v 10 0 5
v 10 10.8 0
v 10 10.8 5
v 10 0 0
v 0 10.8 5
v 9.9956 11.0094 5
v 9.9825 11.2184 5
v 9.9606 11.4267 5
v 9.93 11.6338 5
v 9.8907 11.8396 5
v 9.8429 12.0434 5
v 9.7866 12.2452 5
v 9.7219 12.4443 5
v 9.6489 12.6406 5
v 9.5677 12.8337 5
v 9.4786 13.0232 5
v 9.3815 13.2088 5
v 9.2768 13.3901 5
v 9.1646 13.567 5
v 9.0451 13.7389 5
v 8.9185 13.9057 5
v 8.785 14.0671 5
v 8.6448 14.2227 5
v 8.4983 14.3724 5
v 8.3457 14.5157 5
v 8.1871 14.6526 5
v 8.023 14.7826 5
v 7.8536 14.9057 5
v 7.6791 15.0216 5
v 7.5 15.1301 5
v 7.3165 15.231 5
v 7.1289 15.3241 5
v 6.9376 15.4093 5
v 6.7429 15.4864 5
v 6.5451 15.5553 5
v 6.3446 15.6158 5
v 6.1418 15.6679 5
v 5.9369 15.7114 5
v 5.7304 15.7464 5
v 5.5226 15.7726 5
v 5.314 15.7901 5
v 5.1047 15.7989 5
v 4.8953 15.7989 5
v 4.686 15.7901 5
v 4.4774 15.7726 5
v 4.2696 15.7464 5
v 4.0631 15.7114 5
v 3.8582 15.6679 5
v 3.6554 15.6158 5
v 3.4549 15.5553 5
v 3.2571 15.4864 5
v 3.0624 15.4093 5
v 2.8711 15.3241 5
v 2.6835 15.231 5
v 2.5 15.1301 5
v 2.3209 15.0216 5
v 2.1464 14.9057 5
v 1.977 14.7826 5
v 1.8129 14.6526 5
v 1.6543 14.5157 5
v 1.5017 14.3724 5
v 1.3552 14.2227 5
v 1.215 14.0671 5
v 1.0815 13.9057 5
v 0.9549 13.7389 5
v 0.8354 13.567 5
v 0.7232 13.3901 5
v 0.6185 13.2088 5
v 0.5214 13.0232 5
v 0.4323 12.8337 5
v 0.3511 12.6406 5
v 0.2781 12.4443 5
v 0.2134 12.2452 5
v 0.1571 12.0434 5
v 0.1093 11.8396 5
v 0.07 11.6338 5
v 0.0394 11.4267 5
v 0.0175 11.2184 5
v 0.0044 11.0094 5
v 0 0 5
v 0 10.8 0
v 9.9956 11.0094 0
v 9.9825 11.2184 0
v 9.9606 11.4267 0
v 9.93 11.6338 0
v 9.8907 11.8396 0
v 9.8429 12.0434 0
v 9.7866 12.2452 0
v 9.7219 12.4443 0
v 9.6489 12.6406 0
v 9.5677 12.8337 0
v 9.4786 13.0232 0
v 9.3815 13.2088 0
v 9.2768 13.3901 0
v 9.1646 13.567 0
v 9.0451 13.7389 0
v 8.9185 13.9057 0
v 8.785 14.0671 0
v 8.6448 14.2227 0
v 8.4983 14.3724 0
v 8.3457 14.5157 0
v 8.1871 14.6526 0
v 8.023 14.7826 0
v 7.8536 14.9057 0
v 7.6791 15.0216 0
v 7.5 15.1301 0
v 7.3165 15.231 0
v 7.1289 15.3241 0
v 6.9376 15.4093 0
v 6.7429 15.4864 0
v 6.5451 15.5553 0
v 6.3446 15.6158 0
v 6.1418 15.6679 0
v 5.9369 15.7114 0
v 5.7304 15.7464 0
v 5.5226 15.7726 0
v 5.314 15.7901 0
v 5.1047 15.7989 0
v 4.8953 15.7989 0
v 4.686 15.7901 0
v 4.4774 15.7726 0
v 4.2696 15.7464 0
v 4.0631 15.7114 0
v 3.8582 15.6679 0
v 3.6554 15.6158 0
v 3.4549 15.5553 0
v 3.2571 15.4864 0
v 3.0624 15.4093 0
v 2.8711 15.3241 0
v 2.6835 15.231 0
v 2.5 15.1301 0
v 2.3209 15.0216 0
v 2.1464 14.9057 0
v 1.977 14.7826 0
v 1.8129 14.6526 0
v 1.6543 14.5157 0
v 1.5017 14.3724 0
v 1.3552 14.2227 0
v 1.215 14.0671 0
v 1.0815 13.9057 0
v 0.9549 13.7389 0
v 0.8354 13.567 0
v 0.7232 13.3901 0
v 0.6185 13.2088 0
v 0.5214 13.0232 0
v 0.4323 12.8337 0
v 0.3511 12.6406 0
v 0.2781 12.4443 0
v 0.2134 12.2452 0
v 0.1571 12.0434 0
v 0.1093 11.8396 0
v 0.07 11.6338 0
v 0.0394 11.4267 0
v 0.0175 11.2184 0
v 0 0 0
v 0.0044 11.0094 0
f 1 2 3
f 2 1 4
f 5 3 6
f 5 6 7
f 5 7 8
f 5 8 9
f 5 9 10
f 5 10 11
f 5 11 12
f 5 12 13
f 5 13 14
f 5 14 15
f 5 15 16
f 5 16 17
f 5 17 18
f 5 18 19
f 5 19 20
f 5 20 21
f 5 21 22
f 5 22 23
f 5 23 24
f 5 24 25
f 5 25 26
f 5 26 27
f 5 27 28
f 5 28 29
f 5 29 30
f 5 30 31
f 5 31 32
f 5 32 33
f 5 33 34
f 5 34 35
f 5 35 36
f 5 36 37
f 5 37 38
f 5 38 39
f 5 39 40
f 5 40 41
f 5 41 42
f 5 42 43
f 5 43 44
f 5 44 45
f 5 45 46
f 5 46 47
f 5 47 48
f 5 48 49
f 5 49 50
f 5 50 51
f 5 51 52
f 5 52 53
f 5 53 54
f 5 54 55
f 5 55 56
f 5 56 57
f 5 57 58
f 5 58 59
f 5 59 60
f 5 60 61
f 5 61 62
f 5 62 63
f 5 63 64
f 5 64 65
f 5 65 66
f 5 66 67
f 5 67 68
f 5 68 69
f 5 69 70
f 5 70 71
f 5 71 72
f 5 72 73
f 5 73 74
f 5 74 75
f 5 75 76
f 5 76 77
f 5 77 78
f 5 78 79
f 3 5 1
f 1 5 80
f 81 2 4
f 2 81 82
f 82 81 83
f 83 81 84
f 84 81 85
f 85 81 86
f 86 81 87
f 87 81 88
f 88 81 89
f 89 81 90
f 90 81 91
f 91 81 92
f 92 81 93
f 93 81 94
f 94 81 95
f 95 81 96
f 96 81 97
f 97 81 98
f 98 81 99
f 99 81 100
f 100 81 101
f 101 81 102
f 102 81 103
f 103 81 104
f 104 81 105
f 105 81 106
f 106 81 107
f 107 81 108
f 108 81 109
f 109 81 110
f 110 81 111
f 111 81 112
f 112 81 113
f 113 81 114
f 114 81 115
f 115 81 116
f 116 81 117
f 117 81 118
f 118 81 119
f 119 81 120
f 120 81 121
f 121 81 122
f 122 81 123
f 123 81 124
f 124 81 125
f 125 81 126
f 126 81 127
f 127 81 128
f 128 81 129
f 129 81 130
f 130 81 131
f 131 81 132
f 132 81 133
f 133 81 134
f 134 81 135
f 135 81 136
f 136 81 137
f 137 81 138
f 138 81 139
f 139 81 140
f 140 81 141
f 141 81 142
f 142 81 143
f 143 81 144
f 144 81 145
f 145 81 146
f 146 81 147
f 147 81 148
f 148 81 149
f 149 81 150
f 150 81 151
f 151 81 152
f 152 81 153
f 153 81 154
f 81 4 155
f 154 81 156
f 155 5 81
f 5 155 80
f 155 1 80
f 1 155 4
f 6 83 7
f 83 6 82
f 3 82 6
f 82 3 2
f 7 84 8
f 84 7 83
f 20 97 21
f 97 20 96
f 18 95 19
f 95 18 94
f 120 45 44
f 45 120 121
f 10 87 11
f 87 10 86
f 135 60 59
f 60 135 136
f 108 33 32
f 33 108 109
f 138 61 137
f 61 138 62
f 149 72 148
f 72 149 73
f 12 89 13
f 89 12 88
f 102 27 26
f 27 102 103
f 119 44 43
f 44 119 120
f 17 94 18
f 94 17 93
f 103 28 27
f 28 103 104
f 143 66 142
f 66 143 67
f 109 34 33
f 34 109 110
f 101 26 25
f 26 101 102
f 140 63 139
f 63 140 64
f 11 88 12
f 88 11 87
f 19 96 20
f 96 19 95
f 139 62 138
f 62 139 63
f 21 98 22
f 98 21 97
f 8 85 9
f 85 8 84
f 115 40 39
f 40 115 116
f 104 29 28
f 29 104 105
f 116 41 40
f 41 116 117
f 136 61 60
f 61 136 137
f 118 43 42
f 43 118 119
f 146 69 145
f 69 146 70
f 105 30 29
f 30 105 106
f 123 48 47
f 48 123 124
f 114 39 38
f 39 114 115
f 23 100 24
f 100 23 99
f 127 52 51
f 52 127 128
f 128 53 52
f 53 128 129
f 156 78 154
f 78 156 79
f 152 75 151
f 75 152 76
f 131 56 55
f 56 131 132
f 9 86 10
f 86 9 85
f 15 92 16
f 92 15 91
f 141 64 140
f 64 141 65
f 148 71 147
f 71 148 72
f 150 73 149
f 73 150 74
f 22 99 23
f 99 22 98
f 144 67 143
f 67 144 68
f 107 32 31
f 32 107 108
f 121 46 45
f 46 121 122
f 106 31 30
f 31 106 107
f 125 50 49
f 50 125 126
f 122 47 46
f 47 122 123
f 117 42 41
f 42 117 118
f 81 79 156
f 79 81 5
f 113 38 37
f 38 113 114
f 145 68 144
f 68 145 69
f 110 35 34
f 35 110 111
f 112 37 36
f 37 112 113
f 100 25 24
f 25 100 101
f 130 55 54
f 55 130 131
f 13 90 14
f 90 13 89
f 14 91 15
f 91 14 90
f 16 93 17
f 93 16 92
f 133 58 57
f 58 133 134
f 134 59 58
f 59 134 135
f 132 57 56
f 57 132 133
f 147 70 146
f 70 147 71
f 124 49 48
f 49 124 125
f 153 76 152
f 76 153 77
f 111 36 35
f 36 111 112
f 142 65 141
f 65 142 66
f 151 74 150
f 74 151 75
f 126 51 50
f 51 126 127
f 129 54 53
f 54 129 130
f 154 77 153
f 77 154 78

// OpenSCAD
$fn = 150;

union() {
	cube(size = [10.0, 10.799999999999999, 5]);
	translate(v = [0, 10.799999999999999, 0]) {
		translate(v = [5.0, 0, 0]) {
			cylinder(d = 10.0, h = 5);
		}
	}
}
